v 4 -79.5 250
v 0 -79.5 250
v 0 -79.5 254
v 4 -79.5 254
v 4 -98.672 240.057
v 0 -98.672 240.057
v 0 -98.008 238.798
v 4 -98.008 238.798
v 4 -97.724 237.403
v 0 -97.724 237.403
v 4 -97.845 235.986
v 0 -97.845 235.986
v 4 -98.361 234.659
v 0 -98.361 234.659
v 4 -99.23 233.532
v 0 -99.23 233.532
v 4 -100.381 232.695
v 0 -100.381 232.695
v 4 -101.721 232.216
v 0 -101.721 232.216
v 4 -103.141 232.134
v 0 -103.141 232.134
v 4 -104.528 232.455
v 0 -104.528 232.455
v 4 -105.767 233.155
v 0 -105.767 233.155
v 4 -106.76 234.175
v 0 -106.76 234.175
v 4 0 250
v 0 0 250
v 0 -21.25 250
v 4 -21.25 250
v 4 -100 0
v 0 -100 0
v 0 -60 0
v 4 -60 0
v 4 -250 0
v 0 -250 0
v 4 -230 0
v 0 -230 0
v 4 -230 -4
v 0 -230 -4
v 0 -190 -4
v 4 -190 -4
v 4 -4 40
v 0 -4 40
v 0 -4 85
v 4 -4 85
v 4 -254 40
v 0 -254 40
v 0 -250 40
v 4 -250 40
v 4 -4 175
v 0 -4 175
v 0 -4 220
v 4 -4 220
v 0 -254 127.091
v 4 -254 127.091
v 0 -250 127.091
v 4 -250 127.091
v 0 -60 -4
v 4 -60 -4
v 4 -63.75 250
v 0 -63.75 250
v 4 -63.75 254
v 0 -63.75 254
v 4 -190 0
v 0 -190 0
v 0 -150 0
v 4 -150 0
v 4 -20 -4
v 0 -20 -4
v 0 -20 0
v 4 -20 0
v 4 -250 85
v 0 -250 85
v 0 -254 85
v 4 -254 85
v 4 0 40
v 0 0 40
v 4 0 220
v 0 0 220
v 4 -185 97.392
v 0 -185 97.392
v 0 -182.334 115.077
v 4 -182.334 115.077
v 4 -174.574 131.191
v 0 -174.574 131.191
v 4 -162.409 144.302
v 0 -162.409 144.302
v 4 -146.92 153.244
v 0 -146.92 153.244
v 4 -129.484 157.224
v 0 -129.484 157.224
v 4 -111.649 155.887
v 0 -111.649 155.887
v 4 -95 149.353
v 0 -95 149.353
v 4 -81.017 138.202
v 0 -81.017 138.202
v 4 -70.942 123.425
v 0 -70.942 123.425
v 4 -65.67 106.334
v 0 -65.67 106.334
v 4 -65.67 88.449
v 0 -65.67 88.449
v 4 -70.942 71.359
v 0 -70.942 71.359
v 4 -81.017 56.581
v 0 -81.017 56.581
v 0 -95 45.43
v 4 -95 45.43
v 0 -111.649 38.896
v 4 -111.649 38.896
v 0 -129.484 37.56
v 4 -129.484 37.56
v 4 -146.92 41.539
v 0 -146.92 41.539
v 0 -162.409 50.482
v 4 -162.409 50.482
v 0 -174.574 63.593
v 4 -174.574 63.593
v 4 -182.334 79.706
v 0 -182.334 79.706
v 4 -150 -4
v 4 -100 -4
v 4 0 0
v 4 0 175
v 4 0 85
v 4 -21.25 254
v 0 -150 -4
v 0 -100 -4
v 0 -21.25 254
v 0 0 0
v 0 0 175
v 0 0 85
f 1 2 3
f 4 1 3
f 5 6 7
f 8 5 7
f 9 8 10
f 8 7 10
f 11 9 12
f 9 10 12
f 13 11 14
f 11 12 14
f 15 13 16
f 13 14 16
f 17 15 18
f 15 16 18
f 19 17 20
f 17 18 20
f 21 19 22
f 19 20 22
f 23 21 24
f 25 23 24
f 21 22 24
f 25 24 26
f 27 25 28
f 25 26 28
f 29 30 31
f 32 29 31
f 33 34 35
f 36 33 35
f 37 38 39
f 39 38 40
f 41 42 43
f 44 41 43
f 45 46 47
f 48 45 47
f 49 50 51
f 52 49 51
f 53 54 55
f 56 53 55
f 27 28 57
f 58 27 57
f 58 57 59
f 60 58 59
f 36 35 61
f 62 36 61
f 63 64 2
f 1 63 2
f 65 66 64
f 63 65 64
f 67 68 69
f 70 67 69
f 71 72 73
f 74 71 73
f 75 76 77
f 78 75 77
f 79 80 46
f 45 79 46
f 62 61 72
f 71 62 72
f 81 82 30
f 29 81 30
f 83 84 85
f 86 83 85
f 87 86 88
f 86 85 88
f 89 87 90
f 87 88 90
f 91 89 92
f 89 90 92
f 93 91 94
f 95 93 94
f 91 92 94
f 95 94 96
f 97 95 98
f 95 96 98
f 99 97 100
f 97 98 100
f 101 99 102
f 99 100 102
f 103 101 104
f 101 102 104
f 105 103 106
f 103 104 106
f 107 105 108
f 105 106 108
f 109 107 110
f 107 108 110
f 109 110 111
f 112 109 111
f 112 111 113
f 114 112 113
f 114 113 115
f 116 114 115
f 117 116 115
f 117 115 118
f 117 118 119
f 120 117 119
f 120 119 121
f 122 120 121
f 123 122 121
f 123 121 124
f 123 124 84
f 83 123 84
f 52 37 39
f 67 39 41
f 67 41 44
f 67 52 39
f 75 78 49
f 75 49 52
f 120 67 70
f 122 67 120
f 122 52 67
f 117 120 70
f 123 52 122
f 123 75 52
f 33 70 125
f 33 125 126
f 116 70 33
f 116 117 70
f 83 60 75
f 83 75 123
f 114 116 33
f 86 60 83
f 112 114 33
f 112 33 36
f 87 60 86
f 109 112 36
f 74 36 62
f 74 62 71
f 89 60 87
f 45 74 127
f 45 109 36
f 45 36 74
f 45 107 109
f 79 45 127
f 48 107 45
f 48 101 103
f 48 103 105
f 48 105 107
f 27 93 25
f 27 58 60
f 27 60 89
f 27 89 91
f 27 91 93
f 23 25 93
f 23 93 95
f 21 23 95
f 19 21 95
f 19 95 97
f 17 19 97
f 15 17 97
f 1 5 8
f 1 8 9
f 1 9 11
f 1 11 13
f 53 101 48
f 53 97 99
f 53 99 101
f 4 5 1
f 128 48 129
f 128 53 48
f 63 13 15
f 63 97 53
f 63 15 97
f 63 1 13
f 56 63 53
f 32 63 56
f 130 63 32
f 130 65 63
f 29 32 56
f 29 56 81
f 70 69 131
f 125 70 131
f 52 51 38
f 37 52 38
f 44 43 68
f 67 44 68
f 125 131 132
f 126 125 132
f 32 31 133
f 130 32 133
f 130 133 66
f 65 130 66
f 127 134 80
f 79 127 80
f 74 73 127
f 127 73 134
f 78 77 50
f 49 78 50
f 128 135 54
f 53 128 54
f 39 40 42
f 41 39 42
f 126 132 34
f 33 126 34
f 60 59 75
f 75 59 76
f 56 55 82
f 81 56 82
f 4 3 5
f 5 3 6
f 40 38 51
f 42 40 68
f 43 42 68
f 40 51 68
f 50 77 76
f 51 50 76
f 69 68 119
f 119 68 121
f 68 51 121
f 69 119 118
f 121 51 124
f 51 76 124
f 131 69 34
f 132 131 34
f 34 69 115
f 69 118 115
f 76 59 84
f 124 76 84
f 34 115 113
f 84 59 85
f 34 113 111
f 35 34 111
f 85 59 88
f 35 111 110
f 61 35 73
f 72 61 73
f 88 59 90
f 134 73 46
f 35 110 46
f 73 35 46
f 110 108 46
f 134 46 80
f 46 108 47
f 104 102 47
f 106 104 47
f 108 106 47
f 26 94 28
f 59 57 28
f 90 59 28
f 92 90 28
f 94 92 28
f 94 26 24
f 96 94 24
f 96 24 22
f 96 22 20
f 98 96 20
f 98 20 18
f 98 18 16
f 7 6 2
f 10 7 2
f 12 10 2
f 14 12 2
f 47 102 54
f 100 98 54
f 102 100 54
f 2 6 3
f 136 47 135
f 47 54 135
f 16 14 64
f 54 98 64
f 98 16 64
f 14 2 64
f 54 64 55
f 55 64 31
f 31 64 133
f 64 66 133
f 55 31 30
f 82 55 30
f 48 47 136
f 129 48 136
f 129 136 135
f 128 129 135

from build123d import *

# Parameters (mm, degrees)
F1_DEPTH = 4
F2_R     = 60
F3_DEPTH = 25


with BuildPart() as f1:
    # F0 (on Right) → F1 (new body)
    with BuildSketch(Plane.YZ):
        with BuildLine():
            Line((-20, 0), (0, 0))
            Line((0, 0), (0, 40))
            Line((0, 40), (-4, 40))
            Line((-4, 40), (-4, 85))
            Line((-4, 85), (0, 85))
            Line((0, 85), (0, 175))
            Line((0, 175), (-4, 175))
            Line((-4, 175), (-4, 220))
            Line((-4, 220), (0, 220))
            Line((0, 220), (0, 250))
            Line((0, 250), (-21.25, 250))
            Line((-21.25, 250), (-21.25, 254))
            Line((-21.25, 254), (-63.75, 254))
            Line((-63.75, 254), (-63.75, 250))
            Line((-63.75, 250), (-79.5, 250))
            Line((-79.5, 250), (-79.5, 254))
            Line((-79.5, 254), (-98.672283, 240.056522))
            ThreePointArc((-98.672283, 240.056522), (-99.775105, 233.071983), (-106.759644, 234.174805))
            Line((-106.759644, 234.174805), (-254, 127.090909))
            Line((-254, 127.090909), (-250, 127.090909))
            Line((-250, 127.090909), (-250, 85))
            Line((-250, 85), (-254, 85))
            Line((-254, 85), (-254, 40))
            Line((-254, 40), (-250, 40))
            Line((-250, 40), (-250, 0))
            Line((-250, 0), (-230, 0))
            Line((-230, 0), (-230, -4))
            Line((-230, -4), (-190, -4))
            Line((-190, -4), (-190, 0))
            Line((-190, 0), (-150, 0))
            Line((-150, 0), (-150, -4))
            Line((-150, -4), (-100, -4))
            Line((-100, -4), (-100, 0))
            Line((-100, 0), (-60, 0))
            Line((-60, 0), (-60, -4))
            Line((-60, -4), (-20, -4))
            Line((-20, -4), (-20, 0))
        make_face()
    extrude(amount=F1_DEPTH)

    # F2 (on face) → F3 (cut)
    with BuildSketch(Plane(origin=(0, 0, 0), x_dir=(0, -1, 0), z_dir=(-1, 0, 0))):
        with Locations((125, 97.391762)):
            Circle(F2_R)
    extrude(amount=-F3_DEPTH, mode=Mode.SUBTRACT)


solid = f1.part
